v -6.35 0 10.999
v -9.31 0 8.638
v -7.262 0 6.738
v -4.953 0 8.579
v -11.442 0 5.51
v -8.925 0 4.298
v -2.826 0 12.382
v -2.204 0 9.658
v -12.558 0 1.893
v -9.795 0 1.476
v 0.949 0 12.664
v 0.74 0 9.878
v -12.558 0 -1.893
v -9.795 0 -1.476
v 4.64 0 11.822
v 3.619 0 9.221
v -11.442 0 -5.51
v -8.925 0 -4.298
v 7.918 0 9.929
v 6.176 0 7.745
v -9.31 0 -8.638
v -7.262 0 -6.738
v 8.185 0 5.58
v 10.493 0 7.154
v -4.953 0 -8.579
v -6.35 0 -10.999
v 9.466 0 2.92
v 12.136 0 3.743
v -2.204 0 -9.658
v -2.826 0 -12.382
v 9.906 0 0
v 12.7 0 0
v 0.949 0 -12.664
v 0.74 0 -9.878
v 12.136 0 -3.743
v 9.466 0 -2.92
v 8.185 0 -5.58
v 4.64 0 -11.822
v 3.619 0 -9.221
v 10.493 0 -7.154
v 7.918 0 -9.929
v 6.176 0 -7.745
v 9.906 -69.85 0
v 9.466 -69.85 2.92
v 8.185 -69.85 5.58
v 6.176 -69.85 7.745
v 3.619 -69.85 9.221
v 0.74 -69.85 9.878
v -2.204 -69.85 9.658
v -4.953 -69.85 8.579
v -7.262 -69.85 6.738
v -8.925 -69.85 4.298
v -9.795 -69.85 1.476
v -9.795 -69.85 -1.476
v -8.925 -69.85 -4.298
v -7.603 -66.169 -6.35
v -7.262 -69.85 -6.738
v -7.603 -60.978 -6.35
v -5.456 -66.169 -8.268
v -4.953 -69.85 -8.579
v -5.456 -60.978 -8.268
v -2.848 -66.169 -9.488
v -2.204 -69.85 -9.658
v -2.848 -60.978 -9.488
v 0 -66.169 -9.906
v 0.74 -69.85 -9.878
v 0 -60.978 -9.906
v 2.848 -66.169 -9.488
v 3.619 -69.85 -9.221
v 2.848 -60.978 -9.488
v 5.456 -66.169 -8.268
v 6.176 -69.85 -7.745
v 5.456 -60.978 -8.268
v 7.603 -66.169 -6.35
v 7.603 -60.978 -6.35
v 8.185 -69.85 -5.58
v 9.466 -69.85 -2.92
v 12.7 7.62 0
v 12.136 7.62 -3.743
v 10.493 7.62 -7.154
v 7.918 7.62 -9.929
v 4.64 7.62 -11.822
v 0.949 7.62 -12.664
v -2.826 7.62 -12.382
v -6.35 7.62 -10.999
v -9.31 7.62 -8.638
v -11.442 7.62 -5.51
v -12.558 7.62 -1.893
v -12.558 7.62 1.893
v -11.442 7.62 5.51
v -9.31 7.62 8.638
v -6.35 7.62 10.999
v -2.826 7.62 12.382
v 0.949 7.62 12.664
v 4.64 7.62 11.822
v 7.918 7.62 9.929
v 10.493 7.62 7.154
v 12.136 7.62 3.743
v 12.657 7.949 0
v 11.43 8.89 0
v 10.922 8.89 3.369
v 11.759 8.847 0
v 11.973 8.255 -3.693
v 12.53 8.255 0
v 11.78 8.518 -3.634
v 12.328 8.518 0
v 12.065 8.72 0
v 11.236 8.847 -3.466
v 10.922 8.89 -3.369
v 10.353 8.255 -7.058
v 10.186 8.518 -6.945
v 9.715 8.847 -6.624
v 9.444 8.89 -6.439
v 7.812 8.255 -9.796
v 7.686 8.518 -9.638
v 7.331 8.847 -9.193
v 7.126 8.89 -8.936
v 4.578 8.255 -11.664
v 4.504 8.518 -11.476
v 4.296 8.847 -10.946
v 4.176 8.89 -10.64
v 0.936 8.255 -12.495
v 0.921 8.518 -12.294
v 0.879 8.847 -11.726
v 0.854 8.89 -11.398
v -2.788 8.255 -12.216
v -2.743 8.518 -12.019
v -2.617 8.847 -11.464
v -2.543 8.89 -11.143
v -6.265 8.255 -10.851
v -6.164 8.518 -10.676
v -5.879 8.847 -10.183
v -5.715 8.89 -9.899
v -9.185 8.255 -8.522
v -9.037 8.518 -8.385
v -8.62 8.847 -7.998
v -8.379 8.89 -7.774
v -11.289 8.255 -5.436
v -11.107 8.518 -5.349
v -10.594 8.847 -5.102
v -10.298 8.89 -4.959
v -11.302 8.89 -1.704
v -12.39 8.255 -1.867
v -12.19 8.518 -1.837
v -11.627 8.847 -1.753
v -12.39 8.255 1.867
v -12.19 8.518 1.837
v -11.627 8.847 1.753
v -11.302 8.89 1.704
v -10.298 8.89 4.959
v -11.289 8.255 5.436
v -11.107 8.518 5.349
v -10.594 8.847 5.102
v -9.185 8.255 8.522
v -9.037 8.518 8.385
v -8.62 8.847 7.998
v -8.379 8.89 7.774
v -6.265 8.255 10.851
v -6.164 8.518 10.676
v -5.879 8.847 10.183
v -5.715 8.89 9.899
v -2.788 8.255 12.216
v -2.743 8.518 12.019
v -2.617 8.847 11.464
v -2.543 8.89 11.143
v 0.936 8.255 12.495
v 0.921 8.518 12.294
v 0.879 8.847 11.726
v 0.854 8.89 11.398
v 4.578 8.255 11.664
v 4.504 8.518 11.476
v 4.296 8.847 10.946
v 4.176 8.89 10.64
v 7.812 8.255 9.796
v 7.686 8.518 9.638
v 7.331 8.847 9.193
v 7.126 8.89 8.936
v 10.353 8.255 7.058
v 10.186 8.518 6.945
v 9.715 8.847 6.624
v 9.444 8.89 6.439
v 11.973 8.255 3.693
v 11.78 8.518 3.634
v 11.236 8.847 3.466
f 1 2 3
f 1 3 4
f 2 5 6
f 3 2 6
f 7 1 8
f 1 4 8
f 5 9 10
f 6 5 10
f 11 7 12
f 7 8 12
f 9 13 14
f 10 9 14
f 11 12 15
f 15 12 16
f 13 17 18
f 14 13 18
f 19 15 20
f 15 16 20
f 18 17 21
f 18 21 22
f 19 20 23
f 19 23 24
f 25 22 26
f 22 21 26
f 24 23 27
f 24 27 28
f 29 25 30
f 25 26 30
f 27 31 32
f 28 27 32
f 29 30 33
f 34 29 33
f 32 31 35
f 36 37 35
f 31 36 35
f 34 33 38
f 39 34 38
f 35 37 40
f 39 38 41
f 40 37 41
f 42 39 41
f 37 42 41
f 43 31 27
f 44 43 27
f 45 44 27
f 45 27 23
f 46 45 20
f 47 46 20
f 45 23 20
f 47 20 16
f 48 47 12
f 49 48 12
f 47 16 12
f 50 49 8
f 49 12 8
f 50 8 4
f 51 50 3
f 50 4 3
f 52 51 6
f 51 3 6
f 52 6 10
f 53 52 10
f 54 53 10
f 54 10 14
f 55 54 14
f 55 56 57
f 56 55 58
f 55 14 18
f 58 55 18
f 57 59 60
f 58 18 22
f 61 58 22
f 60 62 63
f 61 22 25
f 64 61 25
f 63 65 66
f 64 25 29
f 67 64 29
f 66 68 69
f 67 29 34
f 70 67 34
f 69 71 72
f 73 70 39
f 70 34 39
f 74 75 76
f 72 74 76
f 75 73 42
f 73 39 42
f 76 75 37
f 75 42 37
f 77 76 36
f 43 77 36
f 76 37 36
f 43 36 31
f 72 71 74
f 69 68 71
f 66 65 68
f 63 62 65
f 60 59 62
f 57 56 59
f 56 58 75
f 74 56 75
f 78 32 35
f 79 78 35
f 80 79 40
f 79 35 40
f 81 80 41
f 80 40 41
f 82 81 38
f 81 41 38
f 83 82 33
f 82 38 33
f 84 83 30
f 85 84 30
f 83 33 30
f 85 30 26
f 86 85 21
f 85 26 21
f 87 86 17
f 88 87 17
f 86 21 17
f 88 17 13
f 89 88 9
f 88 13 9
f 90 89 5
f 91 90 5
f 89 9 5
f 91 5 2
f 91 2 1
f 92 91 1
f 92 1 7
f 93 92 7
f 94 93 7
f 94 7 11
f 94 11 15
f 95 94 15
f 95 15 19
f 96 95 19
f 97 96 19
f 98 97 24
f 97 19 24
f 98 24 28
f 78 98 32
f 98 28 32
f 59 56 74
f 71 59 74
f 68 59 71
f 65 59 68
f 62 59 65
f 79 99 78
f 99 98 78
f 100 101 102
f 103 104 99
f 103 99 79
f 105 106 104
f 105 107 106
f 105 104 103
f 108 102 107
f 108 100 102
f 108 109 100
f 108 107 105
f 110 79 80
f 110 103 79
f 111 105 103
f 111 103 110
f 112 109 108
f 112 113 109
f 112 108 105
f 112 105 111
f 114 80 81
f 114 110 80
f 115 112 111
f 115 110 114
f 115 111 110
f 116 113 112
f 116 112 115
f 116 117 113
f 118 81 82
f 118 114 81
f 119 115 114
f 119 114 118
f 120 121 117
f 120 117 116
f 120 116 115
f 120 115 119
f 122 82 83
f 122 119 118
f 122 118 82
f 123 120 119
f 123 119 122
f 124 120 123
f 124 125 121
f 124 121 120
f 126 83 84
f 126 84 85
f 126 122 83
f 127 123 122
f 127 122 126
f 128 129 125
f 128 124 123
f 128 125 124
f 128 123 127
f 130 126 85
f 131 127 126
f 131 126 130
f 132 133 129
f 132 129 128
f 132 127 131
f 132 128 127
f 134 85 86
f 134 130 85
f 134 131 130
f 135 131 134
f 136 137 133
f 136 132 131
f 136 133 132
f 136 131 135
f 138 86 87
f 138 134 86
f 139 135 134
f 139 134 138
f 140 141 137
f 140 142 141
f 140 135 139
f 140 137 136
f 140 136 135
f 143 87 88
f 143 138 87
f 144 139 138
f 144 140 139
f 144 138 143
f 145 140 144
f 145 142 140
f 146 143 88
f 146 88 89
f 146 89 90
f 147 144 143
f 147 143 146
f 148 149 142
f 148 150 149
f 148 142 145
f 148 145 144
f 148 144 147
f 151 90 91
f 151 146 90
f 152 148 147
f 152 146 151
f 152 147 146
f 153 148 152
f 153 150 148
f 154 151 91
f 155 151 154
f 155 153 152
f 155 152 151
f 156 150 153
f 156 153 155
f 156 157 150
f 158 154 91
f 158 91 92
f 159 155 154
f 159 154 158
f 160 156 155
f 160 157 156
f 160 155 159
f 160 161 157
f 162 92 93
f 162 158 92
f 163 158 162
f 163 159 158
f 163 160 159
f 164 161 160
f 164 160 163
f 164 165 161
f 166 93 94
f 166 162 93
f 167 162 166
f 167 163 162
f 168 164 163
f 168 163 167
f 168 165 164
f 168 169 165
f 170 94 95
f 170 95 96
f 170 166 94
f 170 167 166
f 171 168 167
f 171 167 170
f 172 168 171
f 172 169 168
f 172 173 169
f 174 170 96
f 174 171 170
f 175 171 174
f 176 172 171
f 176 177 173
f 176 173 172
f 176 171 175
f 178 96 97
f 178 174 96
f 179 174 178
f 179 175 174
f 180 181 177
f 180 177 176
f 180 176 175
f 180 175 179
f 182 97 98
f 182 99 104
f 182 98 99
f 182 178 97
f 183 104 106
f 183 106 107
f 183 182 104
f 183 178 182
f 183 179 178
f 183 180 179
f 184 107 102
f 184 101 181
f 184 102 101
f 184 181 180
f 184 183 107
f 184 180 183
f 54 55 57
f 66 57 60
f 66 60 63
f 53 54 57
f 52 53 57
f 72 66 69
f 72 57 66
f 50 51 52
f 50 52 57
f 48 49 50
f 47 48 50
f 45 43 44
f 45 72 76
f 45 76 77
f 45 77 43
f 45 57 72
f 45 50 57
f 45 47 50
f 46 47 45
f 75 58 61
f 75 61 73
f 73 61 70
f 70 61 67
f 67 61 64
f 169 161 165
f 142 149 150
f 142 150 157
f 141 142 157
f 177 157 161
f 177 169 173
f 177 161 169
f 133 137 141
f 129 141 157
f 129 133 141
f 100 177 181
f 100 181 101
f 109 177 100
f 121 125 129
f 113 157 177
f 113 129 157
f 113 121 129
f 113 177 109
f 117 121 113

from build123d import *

# Parameters (mm, degrees)
SKETCH1_R           = 12.7
BOSS_EXTRUDE1_DEPTH = 8.89
SKETCH2_R           = 9.906
BOSS_EXTRUDE2_DEPTH = 69.85
FILLET2_R           = 1.27
CUT_EXTRUDE1_START  = -8.89
SKETCH5_W           = 28.368479266
SKETCH5_H           = 5.191734841
CUT_EXTRUDE1_DEPTH  = 69.85


with BuildPart() as part:
    # Sketch1 → Boss-Extrude1 (new body)
    with BuildSketch(Plane(origin=(0, 0, 0), x_dir=(1, 0, 0), z_dir=(0, 1, 0))):
        Circle(SKETCH1_R)
    extrude(amount=BOSS_EXTRUDE1_DEPTH)

    # Sketch2 → Boss-Extrude2 (add)
    with BuildSketch(Plane.XZ):
        Circle(SKETCH2_R)
    extrude(amount=BOSS_EXTRUDE2_DEPTH)

    # Fillet2
    fillet2_edges = [part.edges().sort_by_distance(p)[0] for p in [
        (-12.7, 8.89, 0),
    ]]
    fillet(fillet2_edges, radius=FILLET2_R)

    # Sketch5 → Cut-Extrude1 (cut)
    with BuildSketch(Plane.XY.offset(2.54).offset(CUT_EXTRUDE1_START)):
        with Locations((1.524929724, -63.573523151)):
            Rectangle(SKETCH5_W, SKETCH5_H)
    extrude(amount=-CUT_EXTRUDE1_DEPTH, mode=Mode.SUBTRACT)


solid = part.part
